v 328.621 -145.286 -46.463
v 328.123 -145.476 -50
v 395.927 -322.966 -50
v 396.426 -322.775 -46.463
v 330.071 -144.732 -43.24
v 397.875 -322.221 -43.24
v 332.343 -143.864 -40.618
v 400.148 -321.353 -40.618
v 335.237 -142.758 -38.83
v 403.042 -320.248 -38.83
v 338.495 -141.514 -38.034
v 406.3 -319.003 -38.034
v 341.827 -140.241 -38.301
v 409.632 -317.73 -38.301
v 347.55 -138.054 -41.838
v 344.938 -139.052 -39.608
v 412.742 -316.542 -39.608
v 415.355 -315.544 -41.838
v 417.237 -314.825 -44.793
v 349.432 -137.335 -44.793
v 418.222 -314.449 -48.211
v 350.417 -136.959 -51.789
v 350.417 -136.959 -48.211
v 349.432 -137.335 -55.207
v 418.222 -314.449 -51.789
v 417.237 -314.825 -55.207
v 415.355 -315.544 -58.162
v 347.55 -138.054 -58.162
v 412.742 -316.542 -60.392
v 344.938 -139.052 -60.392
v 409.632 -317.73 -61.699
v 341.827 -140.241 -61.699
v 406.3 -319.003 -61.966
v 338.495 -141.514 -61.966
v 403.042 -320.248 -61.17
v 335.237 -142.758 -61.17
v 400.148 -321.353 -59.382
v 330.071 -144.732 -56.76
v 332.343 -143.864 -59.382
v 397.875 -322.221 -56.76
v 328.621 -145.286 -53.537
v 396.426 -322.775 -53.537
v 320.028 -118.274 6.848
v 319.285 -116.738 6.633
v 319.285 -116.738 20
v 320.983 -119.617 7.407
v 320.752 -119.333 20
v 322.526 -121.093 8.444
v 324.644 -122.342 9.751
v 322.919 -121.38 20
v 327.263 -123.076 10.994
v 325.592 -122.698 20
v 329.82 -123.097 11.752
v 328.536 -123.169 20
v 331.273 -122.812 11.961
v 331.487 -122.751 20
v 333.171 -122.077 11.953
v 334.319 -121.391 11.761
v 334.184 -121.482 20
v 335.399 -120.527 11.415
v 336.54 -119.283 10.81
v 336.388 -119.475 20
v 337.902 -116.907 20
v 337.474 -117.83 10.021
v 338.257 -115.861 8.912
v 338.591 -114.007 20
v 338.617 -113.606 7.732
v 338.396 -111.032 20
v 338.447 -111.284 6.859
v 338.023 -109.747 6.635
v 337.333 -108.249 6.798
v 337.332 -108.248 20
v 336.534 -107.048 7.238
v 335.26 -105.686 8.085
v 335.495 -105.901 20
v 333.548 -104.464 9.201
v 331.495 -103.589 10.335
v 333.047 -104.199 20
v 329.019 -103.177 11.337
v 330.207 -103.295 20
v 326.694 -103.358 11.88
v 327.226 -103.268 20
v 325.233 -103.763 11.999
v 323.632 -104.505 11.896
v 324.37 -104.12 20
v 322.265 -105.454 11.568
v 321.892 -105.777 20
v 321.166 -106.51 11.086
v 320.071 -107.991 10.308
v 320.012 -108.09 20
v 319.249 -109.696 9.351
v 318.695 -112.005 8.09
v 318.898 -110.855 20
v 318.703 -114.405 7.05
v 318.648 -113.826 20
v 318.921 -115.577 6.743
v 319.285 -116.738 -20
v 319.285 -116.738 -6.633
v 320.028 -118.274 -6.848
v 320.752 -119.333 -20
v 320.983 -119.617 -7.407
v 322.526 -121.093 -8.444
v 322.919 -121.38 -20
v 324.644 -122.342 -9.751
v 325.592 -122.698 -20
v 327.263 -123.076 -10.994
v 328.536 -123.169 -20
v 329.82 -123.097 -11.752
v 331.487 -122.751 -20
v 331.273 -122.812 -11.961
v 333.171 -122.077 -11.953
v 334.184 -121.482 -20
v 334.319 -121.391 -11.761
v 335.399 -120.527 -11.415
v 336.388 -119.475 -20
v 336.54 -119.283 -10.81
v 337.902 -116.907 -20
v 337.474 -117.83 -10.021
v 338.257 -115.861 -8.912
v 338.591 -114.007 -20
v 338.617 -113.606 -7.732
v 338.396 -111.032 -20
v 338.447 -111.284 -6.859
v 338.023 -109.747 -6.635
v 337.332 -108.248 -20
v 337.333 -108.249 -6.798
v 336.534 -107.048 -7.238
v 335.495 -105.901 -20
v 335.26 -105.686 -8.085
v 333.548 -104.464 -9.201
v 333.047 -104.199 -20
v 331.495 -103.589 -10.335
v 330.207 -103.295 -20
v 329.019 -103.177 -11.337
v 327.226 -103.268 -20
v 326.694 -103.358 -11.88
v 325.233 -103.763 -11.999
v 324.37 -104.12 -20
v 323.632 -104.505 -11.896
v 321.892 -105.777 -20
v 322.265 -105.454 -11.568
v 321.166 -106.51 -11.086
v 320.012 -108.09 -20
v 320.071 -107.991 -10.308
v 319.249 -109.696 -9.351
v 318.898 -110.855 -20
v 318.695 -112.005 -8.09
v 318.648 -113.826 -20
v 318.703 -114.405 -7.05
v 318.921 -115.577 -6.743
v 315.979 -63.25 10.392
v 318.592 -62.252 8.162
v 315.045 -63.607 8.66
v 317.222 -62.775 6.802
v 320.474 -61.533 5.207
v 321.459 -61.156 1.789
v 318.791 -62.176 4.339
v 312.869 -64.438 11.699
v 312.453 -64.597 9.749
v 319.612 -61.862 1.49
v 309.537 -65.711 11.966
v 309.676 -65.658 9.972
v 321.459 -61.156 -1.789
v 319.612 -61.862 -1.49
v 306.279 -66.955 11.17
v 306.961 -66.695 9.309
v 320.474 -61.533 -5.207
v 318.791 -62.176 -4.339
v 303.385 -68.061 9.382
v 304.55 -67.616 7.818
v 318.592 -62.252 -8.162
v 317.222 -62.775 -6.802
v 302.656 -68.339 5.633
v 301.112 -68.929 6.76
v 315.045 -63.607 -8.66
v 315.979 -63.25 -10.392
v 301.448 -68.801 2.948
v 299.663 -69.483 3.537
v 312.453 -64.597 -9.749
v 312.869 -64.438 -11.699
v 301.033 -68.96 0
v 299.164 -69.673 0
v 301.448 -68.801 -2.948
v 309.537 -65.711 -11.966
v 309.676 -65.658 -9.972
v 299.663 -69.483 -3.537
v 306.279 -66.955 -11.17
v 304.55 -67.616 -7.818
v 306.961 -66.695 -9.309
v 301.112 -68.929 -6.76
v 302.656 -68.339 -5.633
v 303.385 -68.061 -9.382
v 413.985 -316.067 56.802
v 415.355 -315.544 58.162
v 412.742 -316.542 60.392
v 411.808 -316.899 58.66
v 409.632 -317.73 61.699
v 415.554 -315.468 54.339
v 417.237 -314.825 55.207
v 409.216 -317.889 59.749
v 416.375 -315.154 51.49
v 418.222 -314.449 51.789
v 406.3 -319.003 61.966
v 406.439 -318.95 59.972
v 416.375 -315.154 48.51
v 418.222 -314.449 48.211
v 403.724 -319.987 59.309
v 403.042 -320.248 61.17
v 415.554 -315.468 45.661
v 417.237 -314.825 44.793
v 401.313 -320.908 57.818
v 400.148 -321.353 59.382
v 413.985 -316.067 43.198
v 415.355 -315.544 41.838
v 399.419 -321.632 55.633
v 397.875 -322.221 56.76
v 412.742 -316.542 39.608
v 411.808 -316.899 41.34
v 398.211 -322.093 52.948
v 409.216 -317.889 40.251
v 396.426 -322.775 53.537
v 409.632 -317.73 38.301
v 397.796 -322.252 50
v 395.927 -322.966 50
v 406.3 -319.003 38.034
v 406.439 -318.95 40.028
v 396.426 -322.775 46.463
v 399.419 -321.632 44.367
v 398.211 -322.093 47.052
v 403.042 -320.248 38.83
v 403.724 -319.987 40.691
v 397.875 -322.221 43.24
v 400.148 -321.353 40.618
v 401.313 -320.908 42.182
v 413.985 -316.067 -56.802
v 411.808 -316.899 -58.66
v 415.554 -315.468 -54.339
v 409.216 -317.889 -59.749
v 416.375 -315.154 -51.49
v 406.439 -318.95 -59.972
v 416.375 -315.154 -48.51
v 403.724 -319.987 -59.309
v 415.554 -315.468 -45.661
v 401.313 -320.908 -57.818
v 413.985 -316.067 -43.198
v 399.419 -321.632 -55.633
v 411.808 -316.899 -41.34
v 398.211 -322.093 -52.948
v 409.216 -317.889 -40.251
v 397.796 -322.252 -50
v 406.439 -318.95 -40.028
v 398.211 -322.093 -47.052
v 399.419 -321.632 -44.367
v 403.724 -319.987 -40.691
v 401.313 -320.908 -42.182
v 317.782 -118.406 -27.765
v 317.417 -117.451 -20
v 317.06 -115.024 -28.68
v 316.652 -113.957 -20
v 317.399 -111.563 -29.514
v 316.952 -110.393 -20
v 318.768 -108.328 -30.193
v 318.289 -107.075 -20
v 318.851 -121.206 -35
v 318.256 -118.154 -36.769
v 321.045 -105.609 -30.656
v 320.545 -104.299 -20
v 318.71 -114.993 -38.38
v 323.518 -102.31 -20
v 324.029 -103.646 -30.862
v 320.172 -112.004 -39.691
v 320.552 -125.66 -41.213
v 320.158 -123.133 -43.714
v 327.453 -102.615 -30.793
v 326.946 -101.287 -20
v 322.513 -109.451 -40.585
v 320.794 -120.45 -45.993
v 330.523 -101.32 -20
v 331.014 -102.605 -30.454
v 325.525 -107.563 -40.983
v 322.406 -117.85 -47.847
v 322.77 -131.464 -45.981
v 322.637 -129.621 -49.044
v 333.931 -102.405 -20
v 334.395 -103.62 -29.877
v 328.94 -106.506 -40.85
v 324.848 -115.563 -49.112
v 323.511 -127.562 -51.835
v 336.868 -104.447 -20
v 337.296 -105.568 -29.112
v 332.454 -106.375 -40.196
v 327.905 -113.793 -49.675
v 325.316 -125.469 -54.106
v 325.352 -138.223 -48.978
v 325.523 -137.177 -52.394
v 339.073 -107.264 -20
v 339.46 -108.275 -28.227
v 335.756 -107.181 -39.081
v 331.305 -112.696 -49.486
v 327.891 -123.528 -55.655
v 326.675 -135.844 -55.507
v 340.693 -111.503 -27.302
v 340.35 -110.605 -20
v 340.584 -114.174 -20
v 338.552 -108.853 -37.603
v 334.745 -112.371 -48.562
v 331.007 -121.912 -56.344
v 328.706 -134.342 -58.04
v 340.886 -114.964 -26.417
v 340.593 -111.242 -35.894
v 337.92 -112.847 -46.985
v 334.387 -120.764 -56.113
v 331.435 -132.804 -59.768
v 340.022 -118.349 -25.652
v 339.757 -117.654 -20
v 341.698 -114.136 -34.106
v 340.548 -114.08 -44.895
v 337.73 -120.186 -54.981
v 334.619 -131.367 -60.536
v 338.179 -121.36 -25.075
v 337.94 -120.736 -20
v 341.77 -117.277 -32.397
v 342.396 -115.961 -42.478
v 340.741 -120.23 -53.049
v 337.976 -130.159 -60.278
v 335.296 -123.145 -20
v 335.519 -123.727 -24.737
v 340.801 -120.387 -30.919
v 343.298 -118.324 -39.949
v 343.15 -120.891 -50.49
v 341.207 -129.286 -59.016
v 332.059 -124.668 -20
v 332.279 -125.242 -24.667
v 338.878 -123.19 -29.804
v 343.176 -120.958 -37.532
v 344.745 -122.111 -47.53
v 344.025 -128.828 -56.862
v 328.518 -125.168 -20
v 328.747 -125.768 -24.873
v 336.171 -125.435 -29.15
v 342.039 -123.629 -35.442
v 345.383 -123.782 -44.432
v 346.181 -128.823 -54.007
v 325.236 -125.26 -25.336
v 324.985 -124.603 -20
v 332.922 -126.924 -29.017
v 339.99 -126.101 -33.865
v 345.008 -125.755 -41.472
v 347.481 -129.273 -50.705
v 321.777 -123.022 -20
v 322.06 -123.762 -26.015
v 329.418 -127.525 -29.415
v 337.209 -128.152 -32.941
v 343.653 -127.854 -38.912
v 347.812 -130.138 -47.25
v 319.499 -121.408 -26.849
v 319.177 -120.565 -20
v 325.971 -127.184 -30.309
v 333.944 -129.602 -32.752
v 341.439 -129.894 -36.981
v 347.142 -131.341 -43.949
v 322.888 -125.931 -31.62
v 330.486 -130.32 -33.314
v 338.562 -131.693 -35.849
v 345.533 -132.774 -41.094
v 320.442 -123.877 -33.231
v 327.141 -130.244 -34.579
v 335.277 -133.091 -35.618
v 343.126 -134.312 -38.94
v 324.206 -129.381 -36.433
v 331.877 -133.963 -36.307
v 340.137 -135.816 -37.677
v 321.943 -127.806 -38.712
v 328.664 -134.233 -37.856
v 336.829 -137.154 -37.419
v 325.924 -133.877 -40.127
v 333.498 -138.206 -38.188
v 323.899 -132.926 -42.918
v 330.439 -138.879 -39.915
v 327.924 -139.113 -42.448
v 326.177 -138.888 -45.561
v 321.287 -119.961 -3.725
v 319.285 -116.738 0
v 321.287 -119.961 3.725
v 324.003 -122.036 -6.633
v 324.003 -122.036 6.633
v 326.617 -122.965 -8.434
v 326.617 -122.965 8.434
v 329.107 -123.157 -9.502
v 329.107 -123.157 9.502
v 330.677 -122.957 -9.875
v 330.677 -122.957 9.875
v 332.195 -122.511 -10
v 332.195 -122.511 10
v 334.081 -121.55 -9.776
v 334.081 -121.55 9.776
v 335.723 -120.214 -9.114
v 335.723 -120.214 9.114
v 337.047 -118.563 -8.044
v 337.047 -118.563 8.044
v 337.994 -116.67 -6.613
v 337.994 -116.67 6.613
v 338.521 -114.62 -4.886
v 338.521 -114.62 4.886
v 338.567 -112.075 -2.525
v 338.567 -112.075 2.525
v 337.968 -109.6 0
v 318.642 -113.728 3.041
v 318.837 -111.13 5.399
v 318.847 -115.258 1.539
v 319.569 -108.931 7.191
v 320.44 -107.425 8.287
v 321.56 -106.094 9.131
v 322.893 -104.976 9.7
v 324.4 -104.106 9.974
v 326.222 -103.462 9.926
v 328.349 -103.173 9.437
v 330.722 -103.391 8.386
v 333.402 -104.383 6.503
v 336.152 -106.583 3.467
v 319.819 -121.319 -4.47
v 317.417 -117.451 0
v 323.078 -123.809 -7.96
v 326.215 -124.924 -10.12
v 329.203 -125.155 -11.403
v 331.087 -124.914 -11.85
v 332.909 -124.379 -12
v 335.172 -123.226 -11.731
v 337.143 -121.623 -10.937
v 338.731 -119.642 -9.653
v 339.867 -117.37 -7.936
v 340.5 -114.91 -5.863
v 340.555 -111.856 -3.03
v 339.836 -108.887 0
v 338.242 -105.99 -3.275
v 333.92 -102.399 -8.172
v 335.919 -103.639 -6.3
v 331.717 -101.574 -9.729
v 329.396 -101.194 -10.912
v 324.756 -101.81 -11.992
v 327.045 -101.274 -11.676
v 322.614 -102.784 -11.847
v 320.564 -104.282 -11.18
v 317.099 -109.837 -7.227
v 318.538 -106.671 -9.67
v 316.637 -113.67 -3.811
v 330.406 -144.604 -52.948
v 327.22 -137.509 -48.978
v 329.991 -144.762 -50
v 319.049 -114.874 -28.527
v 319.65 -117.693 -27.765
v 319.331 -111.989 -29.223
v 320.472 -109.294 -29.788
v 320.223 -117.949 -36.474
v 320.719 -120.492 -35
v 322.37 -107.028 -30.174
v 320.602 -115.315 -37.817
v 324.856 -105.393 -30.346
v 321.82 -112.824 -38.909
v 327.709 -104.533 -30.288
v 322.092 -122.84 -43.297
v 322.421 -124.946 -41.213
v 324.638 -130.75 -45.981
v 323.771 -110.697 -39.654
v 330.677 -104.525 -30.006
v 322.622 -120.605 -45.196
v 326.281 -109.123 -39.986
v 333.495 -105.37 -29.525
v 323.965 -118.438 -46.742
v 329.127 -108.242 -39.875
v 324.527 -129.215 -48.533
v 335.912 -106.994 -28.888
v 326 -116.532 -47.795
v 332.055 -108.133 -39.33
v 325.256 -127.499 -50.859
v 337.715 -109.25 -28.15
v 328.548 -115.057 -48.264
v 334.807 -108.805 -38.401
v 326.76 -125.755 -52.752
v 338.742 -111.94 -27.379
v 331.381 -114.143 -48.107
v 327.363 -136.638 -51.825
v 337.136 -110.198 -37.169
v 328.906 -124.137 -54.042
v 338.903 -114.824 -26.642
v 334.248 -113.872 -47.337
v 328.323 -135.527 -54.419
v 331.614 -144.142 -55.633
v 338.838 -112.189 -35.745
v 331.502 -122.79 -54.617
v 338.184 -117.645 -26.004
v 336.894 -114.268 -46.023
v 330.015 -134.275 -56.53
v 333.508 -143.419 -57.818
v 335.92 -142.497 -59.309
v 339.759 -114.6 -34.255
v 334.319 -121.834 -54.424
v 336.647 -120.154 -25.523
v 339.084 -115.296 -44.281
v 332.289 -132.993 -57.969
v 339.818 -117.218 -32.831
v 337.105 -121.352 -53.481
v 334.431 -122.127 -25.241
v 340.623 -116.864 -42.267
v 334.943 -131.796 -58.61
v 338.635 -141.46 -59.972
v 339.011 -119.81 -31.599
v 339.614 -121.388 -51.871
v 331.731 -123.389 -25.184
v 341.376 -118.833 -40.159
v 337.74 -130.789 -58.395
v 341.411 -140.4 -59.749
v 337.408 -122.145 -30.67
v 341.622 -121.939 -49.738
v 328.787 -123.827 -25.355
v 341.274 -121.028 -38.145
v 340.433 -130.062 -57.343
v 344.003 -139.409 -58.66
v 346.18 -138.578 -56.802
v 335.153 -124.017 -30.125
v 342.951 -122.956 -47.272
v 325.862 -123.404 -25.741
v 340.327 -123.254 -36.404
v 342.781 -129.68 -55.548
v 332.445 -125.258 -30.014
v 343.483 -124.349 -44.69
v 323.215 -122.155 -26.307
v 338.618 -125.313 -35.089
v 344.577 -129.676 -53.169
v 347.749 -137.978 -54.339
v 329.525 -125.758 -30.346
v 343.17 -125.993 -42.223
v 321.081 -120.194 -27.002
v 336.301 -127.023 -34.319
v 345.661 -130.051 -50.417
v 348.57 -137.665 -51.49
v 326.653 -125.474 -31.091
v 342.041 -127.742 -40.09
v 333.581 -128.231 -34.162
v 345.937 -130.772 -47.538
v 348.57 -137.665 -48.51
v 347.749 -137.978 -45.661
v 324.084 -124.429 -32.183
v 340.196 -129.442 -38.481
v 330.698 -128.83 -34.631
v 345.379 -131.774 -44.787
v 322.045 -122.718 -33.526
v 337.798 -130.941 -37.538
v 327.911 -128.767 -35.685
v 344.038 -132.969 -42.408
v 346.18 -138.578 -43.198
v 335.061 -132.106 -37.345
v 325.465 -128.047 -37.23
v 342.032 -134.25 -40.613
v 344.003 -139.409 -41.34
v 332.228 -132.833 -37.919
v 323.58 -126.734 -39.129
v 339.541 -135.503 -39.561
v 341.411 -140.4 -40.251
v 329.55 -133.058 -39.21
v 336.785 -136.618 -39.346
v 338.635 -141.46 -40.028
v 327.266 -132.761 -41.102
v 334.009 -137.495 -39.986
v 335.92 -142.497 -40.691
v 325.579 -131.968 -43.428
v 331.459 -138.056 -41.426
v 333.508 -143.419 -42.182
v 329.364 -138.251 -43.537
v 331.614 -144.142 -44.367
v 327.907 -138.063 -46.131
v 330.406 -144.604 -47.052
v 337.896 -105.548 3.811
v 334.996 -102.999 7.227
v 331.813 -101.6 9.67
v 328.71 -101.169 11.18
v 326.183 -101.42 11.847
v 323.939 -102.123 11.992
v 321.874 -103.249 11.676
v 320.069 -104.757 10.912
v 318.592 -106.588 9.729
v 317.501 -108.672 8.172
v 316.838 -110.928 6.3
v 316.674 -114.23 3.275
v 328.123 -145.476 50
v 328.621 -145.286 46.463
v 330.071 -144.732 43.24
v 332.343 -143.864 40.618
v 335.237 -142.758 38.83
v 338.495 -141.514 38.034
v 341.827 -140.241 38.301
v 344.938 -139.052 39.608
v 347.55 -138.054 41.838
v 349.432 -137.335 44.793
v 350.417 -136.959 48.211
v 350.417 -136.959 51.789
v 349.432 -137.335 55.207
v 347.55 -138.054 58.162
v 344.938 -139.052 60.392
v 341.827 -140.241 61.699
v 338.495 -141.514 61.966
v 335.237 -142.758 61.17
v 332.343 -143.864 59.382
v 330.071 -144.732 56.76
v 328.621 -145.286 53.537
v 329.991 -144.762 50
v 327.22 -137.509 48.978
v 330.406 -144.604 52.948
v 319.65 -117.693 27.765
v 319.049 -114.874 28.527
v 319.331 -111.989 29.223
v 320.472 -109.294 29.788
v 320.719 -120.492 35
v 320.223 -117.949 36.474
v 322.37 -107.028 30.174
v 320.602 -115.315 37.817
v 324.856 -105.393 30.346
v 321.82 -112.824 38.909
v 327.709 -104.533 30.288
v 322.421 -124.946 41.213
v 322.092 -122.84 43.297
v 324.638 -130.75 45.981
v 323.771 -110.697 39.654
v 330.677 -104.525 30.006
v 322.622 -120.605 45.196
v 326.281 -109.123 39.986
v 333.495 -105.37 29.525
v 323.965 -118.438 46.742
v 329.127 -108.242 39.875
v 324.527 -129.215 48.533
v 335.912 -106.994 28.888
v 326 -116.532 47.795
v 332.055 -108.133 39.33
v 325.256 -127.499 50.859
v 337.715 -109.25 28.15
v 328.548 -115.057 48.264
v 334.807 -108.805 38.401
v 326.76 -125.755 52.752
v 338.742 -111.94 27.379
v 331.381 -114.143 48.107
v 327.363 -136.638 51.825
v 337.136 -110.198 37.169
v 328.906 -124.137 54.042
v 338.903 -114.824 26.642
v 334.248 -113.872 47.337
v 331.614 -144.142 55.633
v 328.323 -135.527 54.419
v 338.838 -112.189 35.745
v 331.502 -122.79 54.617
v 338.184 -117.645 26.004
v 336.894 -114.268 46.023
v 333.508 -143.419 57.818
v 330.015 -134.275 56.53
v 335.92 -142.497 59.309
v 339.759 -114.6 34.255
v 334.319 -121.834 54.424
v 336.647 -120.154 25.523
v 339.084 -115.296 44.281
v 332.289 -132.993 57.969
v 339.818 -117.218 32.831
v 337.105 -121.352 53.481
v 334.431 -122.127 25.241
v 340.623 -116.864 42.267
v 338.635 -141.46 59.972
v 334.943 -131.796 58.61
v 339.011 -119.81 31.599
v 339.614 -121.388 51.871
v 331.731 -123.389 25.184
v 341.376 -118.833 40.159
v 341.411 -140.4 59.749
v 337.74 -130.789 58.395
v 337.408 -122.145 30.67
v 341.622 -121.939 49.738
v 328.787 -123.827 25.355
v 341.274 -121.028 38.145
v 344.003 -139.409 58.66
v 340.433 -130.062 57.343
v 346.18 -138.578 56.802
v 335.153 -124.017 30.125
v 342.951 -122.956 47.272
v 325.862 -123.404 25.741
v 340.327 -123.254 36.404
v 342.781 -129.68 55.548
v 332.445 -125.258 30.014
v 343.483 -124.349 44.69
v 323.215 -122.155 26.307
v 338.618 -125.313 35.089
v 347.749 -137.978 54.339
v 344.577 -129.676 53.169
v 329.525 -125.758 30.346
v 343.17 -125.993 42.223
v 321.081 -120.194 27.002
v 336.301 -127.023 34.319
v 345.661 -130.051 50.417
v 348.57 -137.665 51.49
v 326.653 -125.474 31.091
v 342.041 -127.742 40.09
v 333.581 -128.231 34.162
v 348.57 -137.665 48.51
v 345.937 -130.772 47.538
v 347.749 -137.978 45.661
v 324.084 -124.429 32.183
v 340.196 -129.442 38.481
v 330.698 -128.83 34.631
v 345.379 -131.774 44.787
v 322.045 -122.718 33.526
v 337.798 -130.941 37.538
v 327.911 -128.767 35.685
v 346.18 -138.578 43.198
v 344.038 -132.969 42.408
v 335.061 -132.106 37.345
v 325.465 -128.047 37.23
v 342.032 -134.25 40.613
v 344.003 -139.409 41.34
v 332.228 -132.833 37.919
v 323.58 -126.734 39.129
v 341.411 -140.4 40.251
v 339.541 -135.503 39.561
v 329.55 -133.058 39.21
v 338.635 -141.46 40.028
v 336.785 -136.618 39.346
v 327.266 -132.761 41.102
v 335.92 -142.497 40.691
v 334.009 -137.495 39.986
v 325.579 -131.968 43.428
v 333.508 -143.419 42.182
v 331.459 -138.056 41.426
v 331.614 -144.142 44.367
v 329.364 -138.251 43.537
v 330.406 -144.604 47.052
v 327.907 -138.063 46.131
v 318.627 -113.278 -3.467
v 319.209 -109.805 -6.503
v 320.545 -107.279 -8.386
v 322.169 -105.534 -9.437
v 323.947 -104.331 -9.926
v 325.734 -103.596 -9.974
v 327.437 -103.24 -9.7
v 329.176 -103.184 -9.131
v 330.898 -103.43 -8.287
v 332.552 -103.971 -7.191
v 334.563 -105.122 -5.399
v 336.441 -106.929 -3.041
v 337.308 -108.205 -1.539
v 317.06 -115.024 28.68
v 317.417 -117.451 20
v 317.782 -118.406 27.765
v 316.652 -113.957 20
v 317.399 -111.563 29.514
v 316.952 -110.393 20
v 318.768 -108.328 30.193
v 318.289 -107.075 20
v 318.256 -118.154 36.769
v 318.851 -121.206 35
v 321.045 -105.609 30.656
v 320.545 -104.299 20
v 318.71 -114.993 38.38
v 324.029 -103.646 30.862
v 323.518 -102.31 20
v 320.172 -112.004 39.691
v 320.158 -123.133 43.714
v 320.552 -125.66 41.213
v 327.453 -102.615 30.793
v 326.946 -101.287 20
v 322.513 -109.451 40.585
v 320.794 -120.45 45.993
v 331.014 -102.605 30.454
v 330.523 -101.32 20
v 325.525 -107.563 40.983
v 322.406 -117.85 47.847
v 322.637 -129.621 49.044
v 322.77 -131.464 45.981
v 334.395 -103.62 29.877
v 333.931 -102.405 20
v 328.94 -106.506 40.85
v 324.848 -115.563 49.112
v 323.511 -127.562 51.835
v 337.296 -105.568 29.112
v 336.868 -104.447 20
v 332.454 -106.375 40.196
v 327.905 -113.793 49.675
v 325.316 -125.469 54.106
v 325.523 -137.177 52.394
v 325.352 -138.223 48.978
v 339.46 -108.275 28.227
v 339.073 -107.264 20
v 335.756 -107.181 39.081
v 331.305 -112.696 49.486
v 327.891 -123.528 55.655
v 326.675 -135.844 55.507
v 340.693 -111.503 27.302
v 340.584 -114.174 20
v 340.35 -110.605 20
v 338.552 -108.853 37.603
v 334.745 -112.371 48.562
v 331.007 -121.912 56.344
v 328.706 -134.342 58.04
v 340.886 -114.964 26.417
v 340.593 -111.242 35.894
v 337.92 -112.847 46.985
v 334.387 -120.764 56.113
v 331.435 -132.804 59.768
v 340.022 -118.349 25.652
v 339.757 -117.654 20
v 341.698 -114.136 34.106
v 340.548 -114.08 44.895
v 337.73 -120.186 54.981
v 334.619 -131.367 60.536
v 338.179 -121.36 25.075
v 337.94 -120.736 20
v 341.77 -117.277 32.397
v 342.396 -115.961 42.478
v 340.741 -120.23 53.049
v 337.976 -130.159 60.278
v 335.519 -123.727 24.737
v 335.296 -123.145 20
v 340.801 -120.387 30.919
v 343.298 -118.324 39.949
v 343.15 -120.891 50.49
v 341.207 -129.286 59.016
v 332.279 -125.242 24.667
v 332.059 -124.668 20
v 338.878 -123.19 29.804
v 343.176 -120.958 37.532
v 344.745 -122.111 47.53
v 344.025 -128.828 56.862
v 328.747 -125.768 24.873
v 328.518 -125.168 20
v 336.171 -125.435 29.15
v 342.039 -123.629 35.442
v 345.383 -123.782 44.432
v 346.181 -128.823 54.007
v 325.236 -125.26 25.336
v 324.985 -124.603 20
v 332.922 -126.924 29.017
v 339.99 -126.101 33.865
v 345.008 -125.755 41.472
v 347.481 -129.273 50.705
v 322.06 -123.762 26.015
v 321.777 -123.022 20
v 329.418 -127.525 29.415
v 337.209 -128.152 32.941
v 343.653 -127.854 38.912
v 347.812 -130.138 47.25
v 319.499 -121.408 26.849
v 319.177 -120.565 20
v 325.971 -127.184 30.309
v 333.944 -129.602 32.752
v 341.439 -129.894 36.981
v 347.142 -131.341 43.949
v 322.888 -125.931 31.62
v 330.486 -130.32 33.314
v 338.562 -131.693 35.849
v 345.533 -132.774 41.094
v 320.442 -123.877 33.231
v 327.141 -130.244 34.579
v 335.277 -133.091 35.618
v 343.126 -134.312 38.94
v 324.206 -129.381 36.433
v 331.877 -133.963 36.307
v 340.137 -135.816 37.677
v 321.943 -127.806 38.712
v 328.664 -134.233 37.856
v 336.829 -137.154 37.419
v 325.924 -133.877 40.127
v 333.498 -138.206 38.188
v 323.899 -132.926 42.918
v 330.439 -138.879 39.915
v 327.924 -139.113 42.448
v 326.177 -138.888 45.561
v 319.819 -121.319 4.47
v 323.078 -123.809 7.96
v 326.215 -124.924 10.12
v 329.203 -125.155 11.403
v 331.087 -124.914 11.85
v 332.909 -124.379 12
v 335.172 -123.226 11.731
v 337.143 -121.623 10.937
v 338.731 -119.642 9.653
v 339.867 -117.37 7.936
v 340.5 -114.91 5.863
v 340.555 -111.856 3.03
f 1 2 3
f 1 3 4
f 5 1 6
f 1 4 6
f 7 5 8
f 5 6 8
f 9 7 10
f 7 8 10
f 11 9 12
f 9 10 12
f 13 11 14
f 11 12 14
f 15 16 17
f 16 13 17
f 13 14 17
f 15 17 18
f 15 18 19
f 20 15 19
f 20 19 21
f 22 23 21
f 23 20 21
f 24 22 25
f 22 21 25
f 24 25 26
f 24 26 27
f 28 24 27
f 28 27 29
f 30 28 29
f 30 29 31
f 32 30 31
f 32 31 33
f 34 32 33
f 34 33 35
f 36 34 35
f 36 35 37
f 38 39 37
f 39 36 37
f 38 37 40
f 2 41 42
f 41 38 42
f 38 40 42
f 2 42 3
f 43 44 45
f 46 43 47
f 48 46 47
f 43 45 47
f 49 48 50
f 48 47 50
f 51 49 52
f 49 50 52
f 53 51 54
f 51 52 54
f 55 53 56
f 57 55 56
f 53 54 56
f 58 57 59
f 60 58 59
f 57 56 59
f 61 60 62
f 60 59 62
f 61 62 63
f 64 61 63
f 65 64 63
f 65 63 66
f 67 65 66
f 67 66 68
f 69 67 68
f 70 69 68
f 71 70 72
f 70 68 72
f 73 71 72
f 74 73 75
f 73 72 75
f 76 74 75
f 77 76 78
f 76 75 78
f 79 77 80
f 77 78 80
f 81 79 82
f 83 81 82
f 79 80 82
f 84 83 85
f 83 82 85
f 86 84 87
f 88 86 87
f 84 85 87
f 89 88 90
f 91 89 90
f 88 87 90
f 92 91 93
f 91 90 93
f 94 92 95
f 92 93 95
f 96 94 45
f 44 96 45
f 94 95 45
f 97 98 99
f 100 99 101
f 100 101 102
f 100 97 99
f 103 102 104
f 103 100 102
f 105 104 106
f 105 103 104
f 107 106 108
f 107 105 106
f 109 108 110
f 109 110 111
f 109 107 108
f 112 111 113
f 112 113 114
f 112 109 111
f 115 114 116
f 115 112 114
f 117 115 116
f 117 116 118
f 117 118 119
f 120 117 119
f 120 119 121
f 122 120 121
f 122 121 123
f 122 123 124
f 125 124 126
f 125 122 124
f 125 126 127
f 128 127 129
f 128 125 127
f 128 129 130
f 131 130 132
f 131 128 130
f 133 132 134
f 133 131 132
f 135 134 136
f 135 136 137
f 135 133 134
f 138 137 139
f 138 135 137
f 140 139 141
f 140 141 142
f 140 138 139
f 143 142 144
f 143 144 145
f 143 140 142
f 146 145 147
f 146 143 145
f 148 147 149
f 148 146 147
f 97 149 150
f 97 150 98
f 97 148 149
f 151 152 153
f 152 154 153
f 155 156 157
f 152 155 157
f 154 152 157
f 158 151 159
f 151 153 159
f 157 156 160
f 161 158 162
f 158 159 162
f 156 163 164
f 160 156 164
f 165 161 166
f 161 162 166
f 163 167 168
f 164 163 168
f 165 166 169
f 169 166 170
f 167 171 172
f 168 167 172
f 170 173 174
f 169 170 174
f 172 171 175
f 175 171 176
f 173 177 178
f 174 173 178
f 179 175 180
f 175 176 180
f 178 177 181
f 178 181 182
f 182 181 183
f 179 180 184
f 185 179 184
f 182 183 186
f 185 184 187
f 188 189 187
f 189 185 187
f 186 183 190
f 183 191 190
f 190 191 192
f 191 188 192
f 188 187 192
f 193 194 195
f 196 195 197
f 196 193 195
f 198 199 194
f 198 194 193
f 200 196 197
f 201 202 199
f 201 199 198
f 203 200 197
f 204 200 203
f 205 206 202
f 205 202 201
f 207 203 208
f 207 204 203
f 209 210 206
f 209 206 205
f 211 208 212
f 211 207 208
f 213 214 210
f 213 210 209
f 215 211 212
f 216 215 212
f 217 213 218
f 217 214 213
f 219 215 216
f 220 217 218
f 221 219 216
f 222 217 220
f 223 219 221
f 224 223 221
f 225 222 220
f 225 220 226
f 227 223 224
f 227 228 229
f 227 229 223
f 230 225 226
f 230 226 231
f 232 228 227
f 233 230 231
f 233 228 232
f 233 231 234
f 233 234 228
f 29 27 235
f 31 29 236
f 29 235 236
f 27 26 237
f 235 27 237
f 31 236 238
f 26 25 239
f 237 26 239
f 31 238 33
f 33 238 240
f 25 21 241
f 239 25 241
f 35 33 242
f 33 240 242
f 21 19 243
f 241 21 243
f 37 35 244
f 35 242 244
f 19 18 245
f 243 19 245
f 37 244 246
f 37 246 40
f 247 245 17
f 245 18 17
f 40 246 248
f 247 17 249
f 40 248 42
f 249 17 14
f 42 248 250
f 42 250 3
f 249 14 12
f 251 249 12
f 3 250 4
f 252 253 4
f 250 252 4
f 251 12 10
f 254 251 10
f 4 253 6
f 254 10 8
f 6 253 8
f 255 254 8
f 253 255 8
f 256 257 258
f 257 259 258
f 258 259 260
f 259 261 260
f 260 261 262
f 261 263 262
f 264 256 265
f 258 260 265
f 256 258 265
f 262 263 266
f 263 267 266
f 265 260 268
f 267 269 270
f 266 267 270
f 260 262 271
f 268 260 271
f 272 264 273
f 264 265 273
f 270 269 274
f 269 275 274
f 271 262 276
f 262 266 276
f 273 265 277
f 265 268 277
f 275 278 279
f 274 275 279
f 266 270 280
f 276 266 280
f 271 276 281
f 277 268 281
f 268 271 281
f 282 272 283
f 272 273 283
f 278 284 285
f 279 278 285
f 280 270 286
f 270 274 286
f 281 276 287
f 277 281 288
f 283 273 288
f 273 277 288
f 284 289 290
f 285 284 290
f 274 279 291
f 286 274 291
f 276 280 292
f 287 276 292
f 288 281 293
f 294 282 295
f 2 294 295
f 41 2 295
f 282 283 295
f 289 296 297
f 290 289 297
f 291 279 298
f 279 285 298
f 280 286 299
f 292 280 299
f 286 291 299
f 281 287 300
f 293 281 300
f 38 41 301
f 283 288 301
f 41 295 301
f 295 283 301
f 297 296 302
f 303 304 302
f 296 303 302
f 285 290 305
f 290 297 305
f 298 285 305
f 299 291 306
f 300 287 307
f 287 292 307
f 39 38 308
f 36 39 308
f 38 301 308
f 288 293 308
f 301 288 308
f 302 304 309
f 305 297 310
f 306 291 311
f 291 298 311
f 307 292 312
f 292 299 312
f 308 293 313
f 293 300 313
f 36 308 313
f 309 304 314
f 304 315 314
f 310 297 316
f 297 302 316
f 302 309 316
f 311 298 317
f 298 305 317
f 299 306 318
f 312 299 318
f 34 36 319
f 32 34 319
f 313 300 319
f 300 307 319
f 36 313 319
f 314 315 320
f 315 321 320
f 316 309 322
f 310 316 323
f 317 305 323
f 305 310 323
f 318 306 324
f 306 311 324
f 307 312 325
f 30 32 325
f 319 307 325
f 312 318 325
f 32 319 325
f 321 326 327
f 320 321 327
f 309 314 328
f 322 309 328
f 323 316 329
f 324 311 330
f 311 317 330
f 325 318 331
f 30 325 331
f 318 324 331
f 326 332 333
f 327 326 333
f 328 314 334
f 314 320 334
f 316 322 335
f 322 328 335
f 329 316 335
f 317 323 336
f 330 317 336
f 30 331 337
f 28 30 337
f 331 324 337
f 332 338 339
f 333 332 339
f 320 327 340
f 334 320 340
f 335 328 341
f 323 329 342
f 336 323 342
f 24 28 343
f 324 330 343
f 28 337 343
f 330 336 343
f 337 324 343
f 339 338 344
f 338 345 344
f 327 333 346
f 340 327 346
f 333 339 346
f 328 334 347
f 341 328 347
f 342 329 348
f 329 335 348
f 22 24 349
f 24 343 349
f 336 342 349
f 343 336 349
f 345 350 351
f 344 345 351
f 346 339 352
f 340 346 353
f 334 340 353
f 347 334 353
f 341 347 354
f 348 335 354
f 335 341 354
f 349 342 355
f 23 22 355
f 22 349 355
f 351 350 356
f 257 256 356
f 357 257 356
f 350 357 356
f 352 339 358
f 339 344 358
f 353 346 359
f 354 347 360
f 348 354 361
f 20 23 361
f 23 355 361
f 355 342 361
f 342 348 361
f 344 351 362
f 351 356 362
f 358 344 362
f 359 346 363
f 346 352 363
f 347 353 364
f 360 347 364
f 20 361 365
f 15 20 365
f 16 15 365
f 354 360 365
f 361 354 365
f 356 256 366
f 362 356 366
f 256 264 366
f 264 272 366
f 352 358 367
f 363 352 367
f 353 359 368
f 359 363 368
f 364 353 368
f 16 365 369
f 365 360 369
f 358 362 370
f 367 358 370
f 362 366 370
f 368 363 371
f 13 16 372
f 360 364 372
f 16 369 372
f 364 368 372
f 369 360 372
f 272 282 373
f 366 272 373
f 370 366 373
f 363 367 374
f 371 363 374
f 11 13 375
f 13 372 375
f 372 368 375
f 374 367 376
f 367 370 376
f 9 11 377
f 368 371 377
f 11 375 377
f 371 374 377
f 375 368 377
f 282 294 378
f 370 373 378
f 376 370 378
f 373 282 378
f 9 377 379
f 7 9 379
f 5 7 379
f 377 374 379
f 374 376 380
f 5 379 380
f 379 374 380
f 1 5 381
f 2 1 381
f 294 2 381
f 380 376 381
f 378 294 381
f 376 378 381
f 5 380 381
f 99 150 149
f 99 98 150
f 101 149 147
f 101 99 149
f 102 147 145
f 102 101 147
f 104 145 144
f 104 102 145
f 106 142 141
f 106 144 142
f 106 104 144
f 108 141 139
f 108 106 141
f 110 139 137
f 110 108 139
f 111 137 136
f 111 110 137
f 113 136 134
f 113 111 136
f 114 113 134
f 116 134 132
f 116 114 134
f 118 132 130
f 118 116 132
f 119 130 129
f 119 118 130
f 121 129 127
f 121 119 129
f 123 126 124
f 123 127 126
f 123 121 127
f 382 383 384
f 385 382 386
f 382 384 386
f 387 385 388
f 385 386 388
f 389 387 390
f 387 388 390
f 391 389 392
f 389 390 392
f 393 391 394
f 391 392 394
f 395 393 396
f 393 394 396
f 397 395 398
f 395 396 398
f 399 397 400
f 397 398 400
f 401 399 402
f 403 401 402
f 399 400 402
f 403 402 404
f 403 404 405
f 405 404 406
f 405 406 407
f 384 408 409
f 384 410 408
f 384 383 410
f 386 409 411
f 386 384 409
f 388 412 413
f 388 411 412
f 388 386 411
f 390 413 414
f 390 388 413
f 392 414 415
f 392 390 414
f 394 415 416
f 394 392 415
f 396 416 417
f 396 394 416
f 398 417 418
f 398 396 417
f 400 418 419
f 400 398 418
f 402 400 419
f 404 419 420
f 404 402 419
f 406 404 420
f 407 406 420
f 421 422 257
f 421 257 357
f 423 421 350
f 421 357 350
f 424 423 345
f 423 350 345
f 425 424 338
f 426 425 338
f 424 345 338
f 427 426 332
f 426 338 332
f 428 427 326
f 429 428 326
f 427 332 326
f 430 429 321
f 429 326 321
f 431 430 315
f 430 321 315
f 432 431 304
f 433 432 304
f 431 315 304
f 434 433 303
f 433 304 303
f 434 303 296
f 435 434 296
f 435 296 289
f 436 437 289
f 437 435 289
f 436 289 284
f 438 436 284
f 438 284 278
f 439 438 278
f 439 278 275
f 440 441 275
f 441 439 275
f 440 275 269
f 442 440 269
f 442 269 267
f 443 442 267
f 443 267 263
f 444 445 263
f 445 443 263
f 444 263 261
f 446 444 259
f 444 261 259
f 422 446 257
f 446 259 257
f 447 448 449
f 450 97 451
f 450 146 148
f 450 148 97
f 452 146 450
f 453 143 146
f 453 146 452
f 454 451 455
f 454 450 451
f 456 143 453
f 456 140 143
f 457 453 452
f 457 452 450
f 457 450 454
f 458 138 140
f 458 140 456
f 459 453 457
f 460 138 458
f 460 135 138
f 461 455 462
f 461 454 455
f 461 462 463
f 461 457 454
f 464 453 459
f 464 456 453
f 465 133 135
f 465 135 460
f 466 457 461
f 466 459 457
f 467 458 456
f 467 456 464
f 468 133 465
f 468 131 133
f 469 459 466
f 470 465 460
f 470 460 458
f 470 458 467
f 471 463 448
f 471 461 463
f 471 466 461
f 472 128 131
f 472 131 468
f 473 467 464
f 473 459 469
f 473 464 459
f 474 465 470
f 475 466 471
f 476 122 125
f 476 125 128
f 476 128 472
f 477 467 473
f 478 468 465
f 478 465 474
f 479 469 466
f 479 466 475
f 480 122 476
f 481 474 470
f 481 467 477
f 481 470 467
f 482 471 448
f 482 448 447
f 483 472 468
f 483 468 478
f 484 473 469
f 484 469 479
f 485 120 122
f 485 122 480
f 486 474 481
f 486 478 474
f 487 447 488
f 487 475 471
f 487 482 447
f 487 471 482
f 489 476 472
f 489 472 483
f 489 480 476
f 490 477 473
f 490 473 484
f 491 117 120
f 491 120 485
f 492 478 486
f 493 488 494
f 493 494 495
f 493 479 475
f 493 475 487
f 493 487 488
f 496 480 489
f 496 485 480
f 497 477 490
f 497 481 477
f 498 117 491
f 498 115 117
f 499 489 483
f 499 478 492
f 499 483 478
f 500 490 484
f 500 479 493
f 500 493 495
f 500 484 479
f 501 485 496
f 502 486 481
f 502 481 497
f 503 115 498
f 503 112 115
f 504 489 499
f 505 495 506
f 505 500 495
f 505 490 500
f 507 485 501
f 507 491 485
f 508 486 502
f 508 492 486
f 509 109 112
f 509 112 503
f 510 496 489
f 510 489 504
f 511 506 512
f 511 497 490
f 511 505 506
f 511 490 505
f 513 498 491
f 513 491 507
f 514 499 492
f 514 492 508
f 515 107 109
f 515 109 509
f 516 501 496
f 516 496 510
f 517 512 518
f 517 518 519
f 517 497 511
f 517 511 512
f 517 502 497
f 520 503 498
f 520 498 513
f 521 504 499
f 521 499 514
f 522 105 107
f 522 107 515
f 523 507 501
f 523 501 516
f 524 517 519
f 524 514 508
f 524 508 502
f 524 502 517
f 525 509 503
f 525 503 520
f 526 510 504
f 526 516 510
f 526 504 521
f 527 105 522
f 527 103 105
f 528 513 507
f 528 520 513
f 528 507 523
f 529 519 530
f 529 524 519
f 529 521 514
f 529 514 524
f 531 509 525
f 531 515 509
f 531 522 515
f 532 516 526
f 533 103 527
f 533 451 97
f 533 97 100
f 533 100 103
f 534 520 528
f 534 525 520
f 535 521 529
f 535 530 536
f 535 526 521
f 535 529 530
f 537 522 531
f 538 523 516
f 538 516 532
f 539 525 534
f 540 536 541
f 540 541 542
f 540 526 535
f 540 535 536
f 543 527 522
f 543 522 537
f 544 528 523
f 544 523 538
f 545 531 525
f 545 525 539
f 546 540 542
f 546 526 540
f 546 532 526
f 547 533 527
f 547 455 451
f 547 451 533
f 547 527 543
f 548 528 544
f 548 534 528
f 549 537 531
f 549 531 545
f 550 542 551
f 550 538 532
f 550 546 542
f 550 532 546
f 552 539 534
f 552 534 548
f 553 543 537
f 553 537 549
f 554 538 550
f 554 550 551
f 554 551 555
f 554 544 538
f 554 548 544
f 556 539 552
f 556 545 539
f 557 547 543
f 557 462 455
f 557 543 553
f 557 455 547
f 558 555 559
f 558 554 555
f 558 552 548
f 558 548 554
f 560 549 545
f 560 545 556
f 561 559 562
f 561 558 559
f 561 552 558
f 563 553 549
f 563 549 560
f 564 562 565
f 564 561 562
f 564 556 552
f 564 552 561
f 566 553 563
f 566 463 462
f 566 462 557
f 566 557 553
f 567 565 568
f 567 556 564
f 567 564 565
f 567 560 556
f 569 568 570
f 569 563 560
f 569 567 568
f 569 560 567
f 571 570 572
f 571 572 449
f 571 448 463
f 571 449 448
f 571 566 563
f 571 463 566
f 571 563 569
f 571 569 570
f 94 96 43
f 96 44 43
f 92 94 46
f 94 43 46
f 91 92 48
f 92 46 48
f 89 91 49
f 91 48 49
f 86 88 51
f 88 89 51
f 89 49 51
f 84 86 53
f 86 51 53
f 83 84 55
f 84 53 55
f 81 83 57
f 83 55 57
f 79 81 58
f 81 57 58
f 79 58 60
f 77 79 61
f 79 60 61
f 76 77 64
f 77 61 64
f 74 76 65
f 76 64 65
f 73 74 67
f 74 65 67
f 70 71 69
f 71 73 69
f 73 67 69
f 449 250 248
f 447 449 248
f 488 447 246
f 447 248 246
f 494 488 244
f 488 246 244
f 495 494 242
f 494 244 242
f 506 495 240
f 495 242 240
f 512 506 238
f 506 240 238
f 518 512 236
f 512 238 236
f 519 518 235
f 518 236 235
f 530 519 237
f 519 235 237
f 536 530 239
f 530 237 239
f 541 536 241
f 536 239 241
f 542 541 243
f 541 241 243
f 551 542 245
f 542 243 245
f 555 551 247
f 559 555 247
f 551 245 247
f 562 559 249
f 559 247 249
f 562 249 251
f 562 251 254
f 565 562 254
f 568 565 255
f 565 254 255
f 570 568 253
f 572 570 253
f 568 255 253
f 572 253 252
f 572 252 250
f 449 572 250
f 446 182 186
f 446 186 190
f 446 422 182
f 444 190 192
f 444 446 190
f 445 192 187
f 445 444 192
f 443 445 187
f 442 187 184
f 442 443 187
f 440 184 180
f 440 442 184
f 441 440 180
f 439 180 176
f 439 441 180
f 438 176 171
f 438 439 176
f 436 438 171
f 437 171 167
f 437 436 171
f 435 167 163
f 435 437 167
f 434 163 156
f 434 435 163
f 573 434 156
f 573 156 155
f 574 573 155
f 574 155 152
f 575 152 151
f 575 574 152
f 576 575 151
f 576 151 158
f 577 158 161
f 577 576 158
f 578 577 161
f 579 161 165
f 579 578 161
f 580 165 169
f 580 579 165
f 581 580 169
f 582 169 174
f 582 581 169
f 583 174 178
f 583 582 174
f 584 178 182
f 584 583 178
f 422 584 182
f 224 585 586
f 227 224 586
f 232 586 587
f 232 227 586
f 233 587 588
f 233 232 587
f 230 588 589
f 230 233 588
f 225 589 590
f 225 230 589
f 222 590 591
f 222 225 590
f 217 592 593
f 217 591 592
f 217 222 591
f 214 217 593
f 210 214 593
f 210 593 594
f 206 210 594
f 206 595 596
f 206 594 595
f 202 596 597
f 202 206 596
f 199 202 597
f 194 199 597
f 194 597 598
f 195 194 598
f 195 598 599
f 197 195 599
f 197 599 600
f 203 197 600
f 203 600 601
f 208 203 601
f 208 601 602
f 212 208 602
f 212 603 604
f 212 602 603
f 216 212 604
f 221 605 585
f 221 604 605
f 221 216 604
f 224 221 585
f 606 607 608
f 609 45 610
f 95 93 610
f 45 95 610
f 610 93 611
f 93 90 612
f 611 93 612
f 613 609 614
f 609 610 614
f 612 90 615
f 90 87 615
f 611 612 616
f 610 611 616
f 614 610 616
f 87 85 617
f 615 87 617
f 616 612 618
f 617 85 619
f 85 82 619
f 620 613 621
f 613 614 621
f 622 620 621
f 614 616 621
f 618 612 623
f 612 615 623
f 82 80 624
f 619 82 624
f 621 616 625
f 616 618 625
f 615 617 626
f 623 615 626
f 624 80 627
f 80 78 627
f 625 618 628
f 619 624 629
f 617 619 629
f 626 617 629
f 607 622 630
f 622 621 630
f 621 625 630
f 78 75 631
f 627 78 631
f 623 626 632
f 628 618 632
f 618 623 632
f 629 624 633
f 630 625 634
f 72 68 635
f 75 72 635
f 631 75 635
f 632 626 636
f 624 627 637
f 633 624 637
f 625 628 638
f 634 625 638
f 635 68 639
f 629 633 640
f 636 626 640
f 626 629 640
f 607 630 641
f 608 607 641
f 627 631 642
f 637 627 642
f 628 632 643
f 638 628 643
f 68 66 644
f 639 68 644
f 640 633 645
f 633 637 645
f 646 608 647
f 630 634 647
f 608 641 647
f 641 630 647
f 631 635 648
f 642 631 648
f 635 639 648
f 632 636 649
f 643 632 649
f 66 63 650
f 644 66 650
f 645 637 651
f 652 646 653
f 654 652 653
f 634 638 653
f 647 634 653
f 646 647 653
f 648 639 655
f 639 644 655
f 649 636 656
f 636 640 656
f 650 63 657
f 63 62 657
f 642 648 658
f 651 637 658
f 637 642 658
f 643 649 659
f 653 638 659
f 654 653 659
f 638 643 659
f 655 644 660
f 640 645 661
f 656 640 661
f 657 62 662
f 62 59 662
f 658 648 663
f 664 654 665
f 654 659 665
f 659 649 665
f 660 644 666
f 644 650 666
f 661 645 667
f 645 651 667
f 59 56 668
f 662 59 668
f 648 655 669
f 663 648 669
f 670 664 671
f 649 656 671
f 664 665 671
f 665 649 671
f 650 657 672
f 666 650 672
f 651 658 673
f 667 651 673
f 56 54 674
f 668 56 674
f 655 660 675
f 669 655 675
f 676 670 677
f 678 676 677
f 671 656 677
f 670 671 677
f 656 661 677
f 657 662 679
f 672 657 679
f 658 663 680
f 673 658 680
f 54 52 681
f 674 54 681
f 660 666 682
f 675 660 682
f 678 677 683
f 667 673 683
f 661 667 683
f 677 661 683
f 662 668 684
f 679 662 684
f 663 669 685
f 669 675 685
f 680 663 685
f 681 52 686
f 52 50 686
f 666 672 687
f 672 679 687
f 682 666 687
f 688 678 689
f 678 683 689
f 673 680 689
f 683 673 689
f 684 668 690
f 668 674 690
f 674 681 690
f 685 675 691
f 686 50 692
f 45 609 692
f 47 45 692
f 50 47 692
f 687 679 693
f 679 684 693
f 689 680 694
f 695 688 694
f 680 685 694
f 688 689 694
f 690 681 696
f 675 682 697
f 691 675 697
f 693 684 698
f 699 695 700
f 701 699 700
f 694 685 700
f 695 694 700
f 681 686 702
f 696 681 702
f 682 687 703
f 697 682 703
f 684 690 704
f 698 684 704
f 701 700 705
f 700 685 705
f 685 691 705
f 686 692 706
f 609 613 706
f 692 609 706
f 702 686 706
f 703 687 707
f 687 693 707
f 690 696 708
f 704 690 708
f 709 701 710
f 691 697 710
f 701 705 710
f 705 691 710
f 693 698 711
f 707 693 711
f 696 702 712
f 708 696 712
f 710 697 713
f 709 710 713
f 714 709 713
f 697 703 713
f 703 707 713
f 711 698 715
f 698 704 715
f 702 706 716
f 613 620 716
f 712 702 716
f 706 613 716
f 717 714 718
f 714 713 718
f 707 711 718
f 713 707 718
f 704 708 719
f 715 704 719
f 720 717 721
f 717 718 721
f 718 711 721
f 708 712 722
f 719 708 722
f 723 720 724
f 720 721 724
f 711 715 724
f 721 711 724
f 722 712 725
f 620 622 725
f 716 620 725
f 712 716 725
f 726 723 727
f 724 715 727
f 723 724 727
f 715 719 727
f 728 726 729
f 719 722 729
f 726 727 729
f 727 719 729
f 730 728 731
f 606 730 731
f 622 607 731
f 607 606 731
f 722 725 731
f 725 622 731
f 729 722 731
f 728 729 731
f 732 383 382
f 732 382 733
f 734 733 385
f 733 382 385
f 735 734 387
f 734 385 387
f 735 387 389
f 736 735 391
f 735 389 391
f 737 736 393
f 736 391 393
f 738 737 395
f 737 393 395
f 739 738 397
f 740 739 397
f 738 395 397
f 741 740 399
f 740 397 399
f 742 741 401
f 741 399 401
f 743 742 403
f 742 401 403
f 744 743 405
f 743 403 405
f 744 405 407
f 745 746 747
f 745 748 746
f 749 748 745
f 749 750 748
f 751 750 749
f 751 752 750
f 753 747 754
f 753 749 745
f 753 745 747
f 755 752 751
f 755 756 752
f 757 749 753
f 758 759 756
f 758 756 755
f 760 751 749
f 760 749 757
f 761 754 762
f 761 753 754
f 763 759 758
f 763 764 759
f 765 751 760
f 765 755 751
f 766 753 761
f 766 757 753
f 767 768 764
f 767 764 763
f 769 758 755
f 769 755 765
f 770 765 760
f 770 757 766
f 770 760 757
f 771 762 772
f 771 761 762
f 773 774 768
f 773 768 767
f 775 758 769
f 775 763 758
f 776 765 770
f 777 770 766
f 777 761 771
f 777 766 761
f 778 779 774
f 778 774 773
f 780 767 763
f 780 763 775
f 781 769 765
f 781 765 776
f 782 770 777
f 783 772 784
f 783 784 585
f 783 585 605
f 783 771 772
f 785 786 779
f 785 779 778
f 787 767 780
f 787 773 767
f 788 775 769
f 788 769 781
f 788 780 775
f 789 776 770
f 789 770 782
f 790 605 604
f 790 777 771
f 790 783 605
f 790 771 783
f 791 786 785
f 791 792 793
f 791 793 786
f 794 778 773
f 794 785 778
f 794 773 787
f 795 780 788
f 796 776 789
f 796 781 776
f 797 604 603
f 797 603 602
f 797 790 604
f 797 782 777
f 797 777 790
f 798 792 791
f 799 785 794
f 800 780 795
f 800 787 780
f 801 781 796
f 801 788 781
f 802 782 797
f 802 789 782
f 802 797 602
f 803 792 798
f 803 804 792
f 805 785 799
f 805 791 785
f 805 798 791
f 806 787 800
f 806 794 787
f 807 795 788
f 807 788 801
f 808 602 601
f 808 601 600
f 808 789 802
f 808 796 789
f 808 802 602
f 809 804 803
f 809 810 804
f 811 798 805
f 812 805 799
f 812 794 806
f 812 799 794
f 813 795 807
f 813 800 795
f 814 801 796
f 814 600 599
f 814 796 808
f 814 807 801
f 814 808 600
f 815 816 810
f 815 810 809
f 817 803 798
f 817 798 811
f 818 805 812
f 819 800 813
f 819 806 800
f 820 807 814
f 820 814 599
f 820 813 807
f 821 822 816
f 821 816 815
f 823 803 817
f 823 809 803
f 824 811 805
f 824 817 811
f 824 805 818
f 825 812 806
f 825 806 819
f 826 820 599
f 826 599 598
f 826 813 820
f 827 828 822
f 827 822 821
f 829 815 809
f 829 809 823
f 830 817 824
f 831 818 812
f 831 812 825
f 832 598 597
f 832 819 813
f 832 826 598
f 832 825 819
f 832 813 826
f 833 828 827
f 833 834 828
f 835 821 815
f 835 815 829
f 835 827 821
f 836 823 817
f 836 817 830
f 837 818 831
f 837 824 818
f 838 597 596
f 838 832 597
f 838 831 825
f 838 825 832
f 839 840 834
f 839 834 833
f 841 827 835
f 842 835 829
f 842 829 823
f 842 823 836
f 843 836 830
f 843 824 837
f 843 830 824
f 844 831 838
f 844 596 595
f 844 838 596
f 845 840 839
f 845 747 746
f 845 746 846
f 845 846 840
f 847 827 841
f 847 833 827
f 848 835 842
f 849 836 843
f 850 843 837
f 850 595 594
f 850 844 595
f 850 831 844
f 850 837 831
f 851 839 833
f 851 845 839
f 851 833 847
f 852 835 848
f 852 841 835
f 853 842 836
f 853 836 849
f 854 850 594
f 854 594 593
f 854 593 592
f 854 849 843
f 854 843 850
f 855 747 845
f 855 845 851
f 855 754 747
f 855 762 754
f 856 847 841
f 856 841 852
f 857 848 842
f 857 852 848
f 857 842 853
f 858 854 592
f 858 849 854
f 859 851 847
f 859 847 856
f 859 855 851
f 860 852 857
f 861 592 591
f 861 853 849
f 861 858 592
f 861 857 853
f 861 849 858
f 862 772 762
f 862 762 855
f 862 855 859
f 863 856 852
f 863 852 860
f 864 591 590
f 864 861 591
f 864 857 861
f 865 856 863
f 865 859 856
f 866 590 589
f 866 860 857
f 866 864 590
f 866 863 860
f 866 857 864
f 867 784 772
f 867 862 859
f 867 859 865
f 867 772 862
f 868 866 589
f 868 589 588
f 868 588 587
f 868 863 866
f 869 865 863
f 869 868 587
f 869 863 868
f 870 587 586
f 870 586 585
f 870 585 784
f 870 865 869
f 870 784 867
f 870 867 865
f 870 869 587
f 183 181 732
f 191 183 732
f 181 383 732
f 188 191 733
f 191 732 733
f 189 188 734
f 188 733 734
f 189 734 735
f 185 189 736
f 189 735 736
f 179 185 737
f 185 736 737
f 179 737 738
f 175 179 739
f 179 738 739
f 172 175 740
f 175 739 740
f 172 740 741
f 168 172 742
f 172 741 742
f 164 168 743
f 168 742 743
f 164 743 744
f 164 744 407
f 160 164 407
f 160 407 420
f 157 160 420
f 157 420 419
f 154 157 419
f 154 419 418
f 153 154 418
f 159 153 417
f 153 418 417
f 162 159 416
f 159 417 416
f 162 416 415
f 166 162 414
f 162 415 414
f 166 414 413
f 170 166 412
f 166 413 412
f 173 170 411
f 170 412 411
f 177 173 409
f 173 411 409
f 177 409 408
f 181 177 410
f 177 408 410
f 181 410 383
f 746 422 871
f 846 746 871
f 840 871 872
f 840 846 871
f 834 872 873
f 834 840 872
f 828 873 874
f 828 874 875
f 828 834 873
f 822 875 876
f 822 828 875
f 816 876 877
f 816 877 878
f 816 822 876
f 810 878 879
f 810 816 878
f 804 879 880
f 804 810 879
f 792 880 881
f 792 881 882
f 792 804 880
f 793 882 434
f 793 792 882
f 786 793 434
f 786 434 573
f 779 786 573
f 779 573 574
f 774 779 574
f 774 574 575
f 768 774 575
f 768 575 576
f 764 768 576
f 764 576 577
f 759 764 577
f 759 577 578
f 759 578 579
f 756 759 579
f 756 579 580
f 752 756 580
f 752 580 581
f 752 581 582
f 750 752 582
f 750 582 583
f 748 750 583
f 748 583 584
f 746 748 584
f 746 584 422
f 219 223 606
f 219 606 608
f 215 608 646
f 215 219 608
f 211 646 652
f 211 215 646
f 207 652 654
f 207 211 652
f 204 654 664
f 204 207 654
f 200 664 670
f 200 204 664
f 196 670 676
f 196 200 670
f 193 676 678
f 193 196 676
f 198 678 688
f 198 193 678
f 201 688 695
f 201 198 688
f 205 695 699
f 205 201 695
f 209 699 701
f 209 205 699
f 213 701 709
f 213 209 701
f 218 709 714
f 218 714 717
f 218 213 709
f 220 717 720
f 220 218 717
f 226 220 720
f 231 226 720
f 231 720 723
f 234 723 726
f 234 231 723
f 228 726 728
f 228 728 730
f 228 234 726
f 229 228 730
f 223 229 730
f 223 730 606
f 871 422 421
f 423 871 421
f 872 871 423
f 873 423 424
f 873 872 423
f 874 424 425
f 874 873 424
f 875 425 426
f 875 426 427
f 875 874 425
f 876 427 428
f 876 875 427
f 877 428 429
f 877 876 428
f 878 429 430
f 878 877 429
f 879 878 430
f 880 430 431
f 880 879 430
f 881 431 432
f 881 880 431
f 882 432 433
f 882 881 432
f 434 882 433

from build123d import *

# Parameters (mm, degrees)
SWEEP_THIN1_PROFILE_R   = 12
SWEEP_THIN1_PROFILE_R_2 = 10


with BuildPart() as part:
    # Sweep-Thin1: sweep along a path in Sketch2
    with BuildLine(Plane(origin=(400, -300, 0), x_dir=(0, 0, -1), z_dir=(0.934155191329314, 0.35686703197758807, 0))) as sweep_thin1_path:
        Line((0, 251.145783), (0, 200))
        Line((0, 200), (-20, 200))
        ThreePointArc((-20, 200), (-41.213203, 191.213203), (-50, 170))
        Line((-50, 170), (-50, -20))
    # Sweep-Thin1 profile (on start of the path) → Sweep-Thin1 (sweep)
    with BuildSketch(Plane(origin=(310.37435, -65.390863, 0), x_dir=(-0.934155191329314, -0.35686703197758807, 0), z_dir=(0.35686703197758807, -0.934155191329314, 0))):
        Circle(SWEEP_THIN1_PROFILE_R)
        Circle(SWEEP_THIN1_PROFILE_R_2, mode=Mode.SUBTRACT)
    sweep_thin1 = sweep(path=sweep_thin1_path.line, transition=Transition.RIGHT)

    # Mirror1: Sweep-Thin1 across plane
    add(sweep_thin1.mirror(Plane.XY))


solid = part.part
